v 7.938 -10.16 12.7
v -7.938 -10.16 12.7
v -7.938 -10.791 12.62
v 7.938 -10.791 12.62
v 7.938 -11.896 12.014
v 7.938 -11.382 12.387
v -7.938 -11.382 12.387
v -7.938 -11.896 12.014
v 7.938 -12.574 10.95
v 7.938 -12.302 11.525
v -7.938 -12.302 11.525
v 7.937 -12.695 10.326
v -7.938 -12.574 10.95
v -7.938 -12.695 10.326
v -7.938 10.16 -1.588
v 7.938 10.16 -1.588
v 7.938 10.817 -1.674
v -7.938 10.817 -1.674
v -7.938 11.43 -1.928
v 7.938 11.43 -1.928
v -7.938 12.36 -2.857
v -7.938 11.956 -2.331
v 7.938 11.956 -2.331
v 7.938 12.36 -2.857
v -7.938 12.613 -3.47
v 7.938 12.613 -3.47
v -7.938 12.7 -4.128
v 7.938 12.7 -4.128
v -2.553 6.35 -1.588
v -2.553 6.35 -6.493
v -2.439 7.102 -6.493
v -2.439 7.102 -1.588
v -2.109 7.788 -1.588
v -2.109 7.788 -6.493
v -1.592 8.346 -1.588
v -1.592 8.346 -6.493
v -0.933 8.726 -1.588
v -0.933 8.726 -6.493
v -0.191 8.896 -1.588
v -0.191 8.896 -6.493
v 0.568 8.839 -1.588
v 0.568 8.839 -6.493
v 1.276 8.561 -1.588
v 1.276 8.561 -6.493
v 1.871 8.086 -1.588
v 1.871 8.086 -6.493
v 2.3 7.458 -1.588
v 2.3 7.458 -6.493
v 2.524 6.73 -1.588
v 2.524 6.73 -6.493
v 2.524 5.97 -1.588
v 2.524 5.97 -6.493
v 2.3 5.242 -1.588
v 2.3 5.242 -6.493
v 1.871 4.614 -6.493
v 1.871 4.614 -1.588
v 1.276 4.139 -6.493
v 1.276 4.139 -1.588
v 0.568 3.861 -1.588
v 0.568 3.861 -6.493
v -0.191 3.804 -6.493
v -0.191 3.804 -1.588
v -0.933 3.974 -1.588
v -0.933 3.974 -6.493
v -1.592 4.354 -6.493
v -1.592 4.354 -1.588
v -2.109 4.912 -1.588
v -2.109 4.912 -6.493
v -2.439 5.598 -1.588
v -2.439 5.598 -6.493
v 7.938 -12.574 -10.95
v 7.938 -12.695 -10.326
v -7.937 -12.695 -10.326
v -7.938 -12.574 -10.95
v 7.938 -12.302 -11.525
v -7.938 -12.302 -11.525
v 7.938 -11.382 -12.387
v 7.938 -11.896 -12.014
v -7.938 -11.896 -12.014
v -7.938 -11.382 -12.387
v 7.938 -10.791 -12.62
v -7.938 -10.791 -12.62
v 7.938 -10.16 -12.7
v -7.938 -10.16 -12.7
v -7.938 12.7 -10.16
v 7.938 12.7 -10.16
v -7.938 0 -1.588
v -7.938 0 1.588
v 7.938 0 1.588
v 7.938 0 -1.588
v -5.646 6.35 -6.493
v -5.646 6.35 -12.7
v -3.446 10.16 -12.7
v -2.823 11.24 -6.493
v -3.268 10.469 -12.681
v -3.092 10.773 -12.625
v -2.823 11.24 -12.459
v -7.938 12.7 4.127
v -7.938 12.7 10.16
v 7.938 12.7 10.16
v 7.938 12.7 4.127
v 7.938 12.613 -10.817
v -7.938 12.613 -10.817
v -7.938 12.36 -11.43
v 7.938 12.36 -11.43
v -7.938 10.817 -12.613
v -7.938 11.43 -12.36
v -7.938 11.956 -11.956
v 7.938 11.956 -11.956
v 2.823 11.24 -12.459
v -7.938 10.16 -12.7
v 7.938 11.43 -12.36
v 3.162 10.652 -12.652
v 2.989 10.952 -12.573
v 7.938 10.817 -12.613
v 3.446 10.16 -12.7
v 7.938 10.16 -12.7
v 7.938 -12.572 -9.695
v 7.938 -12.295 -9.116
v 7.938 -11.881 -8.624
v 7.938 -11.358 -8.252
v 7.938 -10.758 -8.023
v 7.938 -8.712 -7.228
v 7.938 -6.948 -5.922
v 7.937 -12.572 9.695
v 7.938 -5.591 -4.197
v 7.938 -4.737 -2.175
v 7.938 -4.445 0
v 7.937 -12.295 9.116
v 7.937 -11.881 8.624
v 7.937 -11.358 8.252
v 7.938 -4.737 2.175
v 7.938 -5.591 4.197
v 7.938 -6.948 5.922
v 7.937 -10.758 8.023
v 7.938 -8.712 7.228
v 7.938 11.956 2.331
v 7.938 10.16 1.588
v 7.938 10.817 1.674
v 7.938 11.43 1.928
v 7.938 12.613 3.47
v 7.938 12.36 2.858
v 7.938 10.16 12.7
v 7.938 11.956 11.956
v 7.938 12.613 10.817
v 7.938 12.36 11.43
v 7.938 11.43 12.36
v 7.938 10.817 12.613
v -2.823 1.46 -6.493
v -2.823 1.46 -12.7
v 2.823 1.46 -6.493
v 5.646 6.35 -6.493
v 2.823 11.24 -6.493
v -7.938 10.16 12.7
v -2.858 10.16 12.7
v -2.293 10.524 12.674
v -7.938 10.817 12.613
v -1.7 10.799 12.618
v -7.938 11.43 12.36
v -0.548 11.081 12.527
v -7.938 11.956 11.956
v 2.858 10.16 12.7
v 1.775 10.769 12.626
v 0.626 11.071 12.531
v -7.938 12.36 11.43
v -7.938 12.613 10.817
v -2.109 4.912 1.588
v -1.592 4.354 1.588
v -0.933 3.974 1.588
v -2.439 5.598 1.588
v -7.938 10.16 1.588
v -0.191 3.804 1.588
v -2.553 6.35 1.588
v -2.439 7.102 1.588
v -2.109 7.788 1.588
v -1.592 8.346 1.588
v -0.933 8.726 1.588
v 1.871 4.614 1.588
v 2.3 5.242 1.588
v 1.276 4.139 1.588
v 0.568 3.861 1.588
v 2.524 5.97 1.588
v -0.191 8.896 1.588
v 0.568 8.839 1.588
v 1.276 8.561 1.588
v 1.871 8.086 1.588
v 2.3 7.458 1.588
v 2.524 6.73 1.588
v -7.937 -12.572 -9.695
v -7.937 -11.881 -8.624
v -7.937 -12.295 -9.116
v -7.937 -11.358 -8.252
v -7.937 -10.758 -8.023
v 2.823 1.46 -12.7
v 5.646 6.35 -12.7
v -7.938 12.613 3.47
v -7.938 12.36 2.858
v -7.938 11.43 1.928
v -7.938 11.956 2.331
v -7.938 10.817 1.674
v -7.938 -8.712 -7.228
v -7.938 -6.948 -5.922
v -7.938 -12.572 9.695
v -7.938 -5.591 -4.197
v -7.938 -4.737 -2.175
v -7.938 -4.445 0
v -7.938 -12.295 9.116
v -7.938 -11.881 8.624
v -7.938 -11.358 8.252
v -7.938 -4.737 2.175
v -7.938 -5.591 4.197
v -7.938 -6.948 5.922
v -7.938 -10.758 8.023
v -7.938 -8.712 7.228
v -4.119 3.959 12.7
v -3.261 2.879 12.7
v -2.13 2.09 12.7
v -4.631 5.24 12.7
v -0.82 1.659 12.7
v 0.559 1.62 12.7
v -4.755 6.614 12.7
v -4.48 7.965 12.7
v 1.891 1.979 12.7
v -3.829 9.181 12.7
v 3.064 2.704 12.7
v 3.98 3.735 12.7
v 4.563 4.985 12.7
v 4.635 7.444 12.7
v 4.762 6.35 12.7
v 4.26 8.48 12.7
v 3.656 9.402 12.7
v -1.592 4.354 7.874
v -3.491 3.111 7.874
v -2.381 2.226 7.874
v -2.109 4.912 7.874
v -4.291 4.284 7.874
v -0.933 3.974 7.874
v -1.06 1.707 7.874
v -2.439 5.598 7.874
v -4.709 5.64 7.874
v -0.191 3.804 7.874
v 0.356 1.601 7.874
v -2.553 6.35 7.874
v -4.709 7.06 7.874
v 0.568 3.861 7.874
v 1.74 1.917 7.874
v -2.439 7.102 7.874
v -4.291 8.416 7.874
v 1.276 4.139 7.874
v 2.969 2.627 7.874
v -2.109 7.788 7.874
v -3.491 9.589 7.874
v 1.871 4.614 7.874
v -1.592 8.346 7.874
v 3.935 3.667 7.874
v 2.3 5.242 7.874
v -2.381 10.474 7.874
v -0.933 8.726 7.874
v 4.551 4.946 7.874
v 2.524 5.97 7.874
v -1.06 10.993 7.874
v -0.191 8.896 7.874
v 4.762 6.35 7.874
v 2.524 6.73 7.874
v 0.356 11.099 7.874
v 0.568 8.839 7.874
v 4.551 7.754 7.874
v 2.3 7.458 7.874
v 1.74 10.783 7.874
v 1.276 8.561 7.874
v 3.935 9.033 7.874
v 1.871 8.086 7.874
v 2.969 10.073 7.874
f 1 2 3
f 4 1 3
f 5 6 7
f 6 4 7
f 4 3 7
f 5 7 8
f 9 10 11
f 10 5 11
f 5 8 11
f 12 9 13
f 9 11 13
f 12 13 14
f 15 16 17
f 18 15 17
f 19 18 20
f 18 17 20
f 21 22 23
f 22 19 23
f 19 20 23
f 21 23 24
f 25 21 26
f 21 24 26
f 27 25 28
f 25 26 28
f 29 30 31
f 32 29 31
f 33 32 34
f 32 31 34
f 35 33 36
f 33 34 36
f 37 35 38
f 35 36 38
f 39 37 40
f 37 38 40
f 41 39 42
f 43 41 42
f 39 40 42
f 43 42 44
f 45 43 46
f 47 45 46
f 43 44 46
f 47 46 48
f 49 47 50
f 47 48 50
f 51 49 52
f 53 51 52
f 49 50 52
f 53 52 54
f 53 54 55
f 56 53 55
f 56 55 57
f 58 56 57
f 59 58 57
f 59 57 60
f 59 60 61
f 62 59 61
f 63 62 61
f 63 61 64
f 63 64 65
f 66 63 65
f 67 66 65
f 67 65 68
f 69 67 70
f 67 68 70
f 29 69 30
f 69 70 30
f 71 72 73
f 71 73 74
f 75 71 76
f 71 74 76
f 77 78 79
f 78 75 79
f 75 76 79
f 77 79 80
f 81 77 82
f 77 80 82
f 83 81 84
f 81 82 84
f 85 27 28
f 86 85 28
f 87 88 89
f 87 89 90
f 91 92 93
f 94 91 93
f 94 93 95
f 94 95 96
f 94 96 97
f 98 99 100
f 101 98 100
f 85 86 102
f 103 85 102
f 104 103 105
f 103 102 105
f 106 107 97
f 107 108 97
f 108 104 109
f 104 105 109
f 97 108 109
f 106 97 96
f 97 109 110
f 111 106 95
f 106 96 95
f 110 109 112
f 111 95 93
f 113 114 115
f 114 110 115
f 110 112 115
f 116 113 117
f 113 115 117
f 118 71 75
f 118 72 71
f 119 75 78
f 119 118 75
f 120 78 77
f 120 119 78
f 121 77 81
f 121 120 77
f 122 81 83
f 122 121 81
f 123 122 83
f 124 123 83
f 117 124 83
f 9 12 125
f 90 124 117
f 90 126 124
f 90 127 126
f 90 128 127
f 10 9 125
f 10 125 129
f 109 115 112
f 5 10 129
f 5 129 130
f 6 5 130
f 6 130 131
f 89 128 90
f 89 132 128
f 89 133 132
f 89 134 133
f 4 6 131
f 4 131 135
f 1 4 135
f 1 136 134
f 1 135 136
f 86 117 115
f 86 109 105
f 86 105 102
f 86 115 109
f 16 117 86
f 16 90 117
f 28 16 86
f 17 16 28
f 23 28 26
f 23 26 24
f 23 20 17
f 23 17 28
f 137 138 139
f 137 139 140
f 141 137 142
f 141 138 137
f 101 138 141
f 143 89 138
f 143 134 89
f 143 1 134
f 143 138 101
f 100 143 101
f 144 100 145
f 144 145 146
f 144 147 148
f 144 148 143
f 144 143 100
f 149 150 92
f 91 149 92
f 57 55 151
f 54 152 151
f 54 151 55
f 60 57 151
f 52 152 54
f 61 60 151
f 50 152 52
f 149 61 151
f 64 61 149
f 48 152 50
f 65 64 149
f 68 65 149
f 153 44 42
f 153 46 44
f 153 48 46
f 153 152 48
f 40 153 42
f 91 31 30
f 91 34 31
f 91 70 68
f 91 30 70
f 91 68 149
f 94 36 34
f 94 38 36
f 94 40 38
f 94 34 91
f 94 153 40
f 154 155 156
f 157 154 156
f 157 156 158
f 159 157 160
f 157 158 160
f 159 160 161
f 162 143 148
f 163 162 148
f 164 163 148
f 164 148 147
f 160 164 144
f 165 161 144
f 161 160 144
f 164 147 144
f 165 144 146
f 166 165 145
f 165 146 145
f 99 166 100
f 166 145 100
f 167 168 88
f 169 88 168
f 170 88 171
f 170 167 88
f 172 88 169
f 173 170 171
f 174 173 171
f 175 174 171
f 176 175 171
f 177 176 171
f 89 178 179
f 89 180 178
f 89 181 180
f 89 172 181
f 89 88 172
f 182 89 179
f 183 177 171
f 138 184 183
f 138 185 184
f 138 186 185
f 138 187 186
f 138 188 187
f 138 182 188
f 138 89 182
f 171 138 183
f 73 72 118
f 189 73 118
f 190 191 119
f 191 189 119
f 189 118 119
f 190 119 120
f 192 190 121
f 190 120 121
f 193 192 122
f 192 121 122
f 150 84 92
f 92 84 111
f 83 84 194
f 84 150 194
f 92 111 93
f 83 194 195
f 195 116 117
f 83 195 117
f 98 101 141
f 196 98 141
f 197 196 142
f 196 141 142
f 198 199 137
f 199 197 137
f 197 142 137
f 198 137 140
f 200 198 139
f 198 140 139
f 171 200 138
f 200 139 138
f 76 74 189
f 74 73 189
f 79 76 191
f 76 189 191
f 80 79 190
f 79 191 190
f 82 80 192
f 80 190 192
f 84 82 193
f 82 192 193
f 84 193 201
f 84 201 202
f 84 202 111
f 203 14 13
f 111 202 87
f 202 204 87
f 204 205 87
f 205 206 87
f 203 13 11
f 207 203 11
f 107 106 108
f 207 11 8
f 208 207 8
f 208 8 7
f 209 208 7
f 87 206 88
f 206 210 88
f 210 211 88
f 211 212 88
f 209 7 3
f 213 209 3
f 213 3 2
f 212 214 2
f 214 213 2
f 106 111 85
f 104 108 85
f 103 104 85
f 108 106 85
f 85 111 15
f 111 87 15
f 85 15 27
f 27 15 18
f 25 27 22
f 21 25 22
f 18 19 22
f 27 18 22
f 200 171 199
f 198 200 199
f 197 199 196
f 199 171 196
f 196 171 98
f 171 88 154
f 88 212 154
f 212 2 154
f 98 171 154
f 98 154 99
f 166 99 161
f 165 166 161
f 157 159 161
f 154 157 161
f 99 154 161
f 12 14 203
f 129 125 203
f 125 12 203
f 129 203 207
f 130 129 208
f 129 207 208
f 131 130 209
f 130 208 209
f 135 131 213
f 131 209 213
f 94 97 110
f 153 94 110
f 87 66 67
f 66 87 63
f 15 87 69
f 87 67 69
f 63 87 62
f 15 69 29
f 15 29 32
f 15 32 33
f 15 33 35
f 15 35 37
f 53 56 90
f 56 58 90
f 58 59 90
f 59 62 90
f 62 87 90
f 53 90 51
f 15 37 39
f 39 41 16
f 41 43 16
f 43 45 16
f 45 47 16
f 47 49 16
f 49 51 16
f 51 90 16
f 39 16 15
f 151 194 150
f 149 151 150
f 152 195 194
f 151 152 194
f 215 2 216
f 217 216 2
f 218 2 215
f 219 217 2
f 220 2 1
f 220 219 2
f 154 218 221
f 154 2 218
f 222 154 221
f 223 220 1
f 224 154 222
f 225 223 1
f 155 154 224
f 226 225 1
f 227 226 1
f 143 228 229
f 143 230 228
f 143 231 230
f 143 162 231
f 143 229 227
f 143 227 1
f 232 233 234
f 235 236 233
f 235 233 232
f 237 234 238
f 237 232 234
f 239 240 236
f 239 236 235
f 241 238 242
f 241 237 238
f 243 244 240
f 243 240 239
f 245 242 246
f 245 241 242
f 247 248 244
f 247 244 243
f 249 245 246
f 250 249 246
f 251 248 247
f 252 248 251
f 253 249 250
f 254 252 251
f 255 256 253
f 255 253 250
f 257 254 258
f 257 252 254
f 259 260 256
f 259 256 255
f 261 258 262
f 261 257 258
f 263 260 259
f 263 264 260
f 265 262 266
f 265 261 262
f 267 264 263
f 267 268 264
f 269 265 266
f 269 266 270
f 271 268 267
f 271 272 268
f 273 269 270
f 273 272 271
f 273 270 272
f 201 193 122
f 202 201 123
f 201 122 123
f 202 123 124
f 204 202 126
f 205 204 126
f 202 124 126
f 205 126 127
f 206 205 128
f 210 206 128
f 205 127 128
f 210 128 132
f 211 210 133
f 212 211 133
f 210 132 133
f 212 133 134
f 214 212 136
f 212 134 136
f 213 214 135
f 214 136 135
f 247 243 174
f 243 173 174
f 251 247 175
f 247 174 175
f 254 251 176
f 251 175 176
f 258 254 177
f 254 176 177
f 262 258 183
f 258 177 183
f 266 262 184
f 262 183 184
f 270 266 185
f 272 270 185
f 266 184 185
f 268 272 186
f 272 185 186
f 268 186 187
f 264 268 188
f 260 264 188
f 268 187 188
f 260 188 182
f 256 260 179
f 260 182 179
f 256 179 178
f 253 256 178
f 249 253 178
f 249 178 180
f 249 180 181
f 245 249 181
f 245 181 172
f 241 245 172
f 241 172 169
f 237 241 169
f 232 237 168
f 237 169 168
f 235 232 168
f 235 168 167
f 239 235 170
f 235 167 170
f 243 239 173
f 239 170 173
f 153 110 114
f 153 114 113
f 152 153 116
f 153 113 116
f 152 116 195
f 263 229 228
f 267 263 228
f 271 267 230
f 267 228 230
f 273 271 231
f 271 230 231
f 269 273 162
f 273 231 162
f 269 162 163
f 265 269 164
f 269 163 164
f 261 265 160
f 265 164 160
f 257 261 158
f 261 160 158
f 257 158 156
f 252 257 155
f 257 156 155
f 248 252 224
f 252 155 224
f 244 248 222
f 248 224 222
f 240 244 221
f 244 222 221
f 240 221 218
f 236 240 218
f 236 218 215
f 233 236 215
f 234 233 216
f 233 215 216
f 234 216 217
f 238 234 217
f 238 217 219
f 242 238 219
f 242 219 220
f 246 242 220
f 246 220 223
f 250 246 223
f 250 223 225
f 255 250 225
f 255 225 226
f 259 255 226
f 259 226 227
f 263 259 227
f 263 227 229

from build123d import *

# Parameters (mm, degrees)
SKETCH1_W                                       = 15.875
SKETCH1_H                                       = 25.4
BOSS_EXTRUDE1_DEPTH                             = 12.7
SKETCH2_R                                       = 8.255
SKETCH2_W                                       = 3.175
SKETCH2_H                                       = 12.7
CUT_EXTRUDE1_DEPTH                              = 24.970724332
CBORE_FOR_10_SOCKET_HEAD_CAP_SCREW1_D           = 5.1054
CBORE_FOR_10_SOCKET_HEAD_CAP_SCREW1_CBORE_D     = 9.525
CBORE_FOR_10_SOCKET_HEAD_CAP_SCREW1_CBORE_DEPTH = 4.826
FILLET2_R                                       = 2.54
CUT_EXTRUDE2_DEPTH                              = 6.207125


with BuildPart() as part:
    # Sketch1 → Boss-Extrude1 (new, symmetric)
    with BuildSketch(Plane.XY):
        Rectangle(SKETCH1_W, SKETCH1_H)
    extrude(amount=BOSS_EXTRUDE1_DEPTH, both=True)

    # Sketch2 → Cut-Extrude1 (cut, through all)
    with BuildSketch(Plane(origin=(7.9375, 0, 0), x_dir=(0, 0, -1), z_dir=(1, 0, 0))):
        with Locations((0, -12.7)):
            Circle(SKETCH2_R)
        with Locations((0, 6.35)):
            Rectangle(SKETCH2_W, SKETCH2_H)
    extrude(amount=-CUT_EXTRUDE1_DEPTH, mode=Mode.SUBTRACT)

    # CBORE for #10 Socket Head Cap Screw1 (through all)
    with Locations(Plane.XY.offset(12.7)):
        with Locations((0, 6.35)):
            CounterBoreHole(CBORE_FOR_10_SOCKET_HEAD_CAP_SCREW1_D / 2, CBORE_FOR_10_SOCKET_HEAD_CAP_SCREW1_CBORE_D / 2, CBORE_FOR_10_SOCKET_HEAD_CAP_SCREW1_CBORE_DEPTH)

    # Fillet2
    # the kernel refuses this fillet: 2.54 mm, written as the material it takes off along each edge
    with BuildSketch(Plane(origin=(13.529804731, -12.7, -8.255), x_dir=(0, 0, -1), z_dir=(-1, 0, 0))) as fillet2_piece_1:
        with BuildLine():
            CenterArc((2.236921893, -2.54), FILLET2_R, 90, 76.391039369)
            ThreePointArc((-0.231765612, -1.942352941), (-0.058146187, -0.978065725), (0, 0))
            Line((0, 0), (2.236921893, 0))
        make_face()
    extrude(amount=27.059609463, mode=Mode.SUBTRACT)
    with BuildSketch(Plane(origin=(-13.529804731, -12.7, 8.255), x_dir=(0, 0.9929562463238144, -0.11848161412860811), z_dir=(1, 0, 0))) as fillet2_piece_2:
        with BuildLine():
            CenterArc((2.257074749, 2.522108866), FILLET2_R, 186.804480315, 76.391039369)
            Line((-0.265034117, 2.221165566), (0, 0))
            ThreePointArc((0, 0), (0.978065725, 0.058146187), (1.956131449, 0))
        make_face()
    extrude(amount=27.059609463, mode=Mode.SUBTRACT)
    with BuildSketch(Plane(origin=(14.2875, 12.7, 12.7), x_dir=(0, 0, -1), z_dir=(-1, 0, 0)), Plane(origin=(14.2875, 12.7, -12.7), x_dir=(0, -1, 0), z_dir=(-1, 0, 0)), Plane(origin=(14.2875, 12.7, -1.5875), x_dir=(0, 0, -1), z_dir=(-1, 0, 0)), Plane(origin=(14.2875, 12.7, 1.5875), x_dir=(0, -1, 0), z_dir=(-1, 0, 0))) as fillet2_piece_3:
        with BuildLine():
            CenterArc((FILLET2_R, FILLET2_R), FILLET2_R, 180, 90)
            Line((0, FILLET2_R), (0, 0))
            Line((0, 0), (FILLET2_R, 0))
        make_face()
    extrude(amount=28.575, mode=Mode.SUBTRACT)
    with BuildSketch(Plane(origin=(-14.2875, -12.7, 12.7), x_dir=(0, 1, 0), z_dir=(1, 0, 0)), Plane(origin=(-14.2875, -12.7, -12.7), x_dir=(0, 0, 1), z_dir=(1, 0, 0))) as fillet2_piece_4:
        with BuildLine():
            CenterArc((FILLET2_R, -FILLET2_R), FILLET2_R, 90, 90)
            Line((0, -FILLET2_R), (0, 0))
            Line((0, 0), (FILLET2_R, 0))
        make_face()
    extrude(amount=28.575, mode=Mode.SUBTRACT)

    # Sketch5 → Cut-Extrude2 (cut)
    with BuildSketch(Plane(origin=(0, 0, -12.7), x_dir=(-1, 0, 0), z_dir=(0, 0, -1))):
        Polygon((5.645908282, 6.35), (2.822954141, 11.2395), (-2.822954141, 11.2395), (-5.645908282, 6.35), (-2.822954141, 1.4605), (2.822954141, 1.4605), align=None)
    extrude(amount=-CUT_EXTRUDE2_DEPTH, mode=Mode.SUBTRACT)


solid = part.part
